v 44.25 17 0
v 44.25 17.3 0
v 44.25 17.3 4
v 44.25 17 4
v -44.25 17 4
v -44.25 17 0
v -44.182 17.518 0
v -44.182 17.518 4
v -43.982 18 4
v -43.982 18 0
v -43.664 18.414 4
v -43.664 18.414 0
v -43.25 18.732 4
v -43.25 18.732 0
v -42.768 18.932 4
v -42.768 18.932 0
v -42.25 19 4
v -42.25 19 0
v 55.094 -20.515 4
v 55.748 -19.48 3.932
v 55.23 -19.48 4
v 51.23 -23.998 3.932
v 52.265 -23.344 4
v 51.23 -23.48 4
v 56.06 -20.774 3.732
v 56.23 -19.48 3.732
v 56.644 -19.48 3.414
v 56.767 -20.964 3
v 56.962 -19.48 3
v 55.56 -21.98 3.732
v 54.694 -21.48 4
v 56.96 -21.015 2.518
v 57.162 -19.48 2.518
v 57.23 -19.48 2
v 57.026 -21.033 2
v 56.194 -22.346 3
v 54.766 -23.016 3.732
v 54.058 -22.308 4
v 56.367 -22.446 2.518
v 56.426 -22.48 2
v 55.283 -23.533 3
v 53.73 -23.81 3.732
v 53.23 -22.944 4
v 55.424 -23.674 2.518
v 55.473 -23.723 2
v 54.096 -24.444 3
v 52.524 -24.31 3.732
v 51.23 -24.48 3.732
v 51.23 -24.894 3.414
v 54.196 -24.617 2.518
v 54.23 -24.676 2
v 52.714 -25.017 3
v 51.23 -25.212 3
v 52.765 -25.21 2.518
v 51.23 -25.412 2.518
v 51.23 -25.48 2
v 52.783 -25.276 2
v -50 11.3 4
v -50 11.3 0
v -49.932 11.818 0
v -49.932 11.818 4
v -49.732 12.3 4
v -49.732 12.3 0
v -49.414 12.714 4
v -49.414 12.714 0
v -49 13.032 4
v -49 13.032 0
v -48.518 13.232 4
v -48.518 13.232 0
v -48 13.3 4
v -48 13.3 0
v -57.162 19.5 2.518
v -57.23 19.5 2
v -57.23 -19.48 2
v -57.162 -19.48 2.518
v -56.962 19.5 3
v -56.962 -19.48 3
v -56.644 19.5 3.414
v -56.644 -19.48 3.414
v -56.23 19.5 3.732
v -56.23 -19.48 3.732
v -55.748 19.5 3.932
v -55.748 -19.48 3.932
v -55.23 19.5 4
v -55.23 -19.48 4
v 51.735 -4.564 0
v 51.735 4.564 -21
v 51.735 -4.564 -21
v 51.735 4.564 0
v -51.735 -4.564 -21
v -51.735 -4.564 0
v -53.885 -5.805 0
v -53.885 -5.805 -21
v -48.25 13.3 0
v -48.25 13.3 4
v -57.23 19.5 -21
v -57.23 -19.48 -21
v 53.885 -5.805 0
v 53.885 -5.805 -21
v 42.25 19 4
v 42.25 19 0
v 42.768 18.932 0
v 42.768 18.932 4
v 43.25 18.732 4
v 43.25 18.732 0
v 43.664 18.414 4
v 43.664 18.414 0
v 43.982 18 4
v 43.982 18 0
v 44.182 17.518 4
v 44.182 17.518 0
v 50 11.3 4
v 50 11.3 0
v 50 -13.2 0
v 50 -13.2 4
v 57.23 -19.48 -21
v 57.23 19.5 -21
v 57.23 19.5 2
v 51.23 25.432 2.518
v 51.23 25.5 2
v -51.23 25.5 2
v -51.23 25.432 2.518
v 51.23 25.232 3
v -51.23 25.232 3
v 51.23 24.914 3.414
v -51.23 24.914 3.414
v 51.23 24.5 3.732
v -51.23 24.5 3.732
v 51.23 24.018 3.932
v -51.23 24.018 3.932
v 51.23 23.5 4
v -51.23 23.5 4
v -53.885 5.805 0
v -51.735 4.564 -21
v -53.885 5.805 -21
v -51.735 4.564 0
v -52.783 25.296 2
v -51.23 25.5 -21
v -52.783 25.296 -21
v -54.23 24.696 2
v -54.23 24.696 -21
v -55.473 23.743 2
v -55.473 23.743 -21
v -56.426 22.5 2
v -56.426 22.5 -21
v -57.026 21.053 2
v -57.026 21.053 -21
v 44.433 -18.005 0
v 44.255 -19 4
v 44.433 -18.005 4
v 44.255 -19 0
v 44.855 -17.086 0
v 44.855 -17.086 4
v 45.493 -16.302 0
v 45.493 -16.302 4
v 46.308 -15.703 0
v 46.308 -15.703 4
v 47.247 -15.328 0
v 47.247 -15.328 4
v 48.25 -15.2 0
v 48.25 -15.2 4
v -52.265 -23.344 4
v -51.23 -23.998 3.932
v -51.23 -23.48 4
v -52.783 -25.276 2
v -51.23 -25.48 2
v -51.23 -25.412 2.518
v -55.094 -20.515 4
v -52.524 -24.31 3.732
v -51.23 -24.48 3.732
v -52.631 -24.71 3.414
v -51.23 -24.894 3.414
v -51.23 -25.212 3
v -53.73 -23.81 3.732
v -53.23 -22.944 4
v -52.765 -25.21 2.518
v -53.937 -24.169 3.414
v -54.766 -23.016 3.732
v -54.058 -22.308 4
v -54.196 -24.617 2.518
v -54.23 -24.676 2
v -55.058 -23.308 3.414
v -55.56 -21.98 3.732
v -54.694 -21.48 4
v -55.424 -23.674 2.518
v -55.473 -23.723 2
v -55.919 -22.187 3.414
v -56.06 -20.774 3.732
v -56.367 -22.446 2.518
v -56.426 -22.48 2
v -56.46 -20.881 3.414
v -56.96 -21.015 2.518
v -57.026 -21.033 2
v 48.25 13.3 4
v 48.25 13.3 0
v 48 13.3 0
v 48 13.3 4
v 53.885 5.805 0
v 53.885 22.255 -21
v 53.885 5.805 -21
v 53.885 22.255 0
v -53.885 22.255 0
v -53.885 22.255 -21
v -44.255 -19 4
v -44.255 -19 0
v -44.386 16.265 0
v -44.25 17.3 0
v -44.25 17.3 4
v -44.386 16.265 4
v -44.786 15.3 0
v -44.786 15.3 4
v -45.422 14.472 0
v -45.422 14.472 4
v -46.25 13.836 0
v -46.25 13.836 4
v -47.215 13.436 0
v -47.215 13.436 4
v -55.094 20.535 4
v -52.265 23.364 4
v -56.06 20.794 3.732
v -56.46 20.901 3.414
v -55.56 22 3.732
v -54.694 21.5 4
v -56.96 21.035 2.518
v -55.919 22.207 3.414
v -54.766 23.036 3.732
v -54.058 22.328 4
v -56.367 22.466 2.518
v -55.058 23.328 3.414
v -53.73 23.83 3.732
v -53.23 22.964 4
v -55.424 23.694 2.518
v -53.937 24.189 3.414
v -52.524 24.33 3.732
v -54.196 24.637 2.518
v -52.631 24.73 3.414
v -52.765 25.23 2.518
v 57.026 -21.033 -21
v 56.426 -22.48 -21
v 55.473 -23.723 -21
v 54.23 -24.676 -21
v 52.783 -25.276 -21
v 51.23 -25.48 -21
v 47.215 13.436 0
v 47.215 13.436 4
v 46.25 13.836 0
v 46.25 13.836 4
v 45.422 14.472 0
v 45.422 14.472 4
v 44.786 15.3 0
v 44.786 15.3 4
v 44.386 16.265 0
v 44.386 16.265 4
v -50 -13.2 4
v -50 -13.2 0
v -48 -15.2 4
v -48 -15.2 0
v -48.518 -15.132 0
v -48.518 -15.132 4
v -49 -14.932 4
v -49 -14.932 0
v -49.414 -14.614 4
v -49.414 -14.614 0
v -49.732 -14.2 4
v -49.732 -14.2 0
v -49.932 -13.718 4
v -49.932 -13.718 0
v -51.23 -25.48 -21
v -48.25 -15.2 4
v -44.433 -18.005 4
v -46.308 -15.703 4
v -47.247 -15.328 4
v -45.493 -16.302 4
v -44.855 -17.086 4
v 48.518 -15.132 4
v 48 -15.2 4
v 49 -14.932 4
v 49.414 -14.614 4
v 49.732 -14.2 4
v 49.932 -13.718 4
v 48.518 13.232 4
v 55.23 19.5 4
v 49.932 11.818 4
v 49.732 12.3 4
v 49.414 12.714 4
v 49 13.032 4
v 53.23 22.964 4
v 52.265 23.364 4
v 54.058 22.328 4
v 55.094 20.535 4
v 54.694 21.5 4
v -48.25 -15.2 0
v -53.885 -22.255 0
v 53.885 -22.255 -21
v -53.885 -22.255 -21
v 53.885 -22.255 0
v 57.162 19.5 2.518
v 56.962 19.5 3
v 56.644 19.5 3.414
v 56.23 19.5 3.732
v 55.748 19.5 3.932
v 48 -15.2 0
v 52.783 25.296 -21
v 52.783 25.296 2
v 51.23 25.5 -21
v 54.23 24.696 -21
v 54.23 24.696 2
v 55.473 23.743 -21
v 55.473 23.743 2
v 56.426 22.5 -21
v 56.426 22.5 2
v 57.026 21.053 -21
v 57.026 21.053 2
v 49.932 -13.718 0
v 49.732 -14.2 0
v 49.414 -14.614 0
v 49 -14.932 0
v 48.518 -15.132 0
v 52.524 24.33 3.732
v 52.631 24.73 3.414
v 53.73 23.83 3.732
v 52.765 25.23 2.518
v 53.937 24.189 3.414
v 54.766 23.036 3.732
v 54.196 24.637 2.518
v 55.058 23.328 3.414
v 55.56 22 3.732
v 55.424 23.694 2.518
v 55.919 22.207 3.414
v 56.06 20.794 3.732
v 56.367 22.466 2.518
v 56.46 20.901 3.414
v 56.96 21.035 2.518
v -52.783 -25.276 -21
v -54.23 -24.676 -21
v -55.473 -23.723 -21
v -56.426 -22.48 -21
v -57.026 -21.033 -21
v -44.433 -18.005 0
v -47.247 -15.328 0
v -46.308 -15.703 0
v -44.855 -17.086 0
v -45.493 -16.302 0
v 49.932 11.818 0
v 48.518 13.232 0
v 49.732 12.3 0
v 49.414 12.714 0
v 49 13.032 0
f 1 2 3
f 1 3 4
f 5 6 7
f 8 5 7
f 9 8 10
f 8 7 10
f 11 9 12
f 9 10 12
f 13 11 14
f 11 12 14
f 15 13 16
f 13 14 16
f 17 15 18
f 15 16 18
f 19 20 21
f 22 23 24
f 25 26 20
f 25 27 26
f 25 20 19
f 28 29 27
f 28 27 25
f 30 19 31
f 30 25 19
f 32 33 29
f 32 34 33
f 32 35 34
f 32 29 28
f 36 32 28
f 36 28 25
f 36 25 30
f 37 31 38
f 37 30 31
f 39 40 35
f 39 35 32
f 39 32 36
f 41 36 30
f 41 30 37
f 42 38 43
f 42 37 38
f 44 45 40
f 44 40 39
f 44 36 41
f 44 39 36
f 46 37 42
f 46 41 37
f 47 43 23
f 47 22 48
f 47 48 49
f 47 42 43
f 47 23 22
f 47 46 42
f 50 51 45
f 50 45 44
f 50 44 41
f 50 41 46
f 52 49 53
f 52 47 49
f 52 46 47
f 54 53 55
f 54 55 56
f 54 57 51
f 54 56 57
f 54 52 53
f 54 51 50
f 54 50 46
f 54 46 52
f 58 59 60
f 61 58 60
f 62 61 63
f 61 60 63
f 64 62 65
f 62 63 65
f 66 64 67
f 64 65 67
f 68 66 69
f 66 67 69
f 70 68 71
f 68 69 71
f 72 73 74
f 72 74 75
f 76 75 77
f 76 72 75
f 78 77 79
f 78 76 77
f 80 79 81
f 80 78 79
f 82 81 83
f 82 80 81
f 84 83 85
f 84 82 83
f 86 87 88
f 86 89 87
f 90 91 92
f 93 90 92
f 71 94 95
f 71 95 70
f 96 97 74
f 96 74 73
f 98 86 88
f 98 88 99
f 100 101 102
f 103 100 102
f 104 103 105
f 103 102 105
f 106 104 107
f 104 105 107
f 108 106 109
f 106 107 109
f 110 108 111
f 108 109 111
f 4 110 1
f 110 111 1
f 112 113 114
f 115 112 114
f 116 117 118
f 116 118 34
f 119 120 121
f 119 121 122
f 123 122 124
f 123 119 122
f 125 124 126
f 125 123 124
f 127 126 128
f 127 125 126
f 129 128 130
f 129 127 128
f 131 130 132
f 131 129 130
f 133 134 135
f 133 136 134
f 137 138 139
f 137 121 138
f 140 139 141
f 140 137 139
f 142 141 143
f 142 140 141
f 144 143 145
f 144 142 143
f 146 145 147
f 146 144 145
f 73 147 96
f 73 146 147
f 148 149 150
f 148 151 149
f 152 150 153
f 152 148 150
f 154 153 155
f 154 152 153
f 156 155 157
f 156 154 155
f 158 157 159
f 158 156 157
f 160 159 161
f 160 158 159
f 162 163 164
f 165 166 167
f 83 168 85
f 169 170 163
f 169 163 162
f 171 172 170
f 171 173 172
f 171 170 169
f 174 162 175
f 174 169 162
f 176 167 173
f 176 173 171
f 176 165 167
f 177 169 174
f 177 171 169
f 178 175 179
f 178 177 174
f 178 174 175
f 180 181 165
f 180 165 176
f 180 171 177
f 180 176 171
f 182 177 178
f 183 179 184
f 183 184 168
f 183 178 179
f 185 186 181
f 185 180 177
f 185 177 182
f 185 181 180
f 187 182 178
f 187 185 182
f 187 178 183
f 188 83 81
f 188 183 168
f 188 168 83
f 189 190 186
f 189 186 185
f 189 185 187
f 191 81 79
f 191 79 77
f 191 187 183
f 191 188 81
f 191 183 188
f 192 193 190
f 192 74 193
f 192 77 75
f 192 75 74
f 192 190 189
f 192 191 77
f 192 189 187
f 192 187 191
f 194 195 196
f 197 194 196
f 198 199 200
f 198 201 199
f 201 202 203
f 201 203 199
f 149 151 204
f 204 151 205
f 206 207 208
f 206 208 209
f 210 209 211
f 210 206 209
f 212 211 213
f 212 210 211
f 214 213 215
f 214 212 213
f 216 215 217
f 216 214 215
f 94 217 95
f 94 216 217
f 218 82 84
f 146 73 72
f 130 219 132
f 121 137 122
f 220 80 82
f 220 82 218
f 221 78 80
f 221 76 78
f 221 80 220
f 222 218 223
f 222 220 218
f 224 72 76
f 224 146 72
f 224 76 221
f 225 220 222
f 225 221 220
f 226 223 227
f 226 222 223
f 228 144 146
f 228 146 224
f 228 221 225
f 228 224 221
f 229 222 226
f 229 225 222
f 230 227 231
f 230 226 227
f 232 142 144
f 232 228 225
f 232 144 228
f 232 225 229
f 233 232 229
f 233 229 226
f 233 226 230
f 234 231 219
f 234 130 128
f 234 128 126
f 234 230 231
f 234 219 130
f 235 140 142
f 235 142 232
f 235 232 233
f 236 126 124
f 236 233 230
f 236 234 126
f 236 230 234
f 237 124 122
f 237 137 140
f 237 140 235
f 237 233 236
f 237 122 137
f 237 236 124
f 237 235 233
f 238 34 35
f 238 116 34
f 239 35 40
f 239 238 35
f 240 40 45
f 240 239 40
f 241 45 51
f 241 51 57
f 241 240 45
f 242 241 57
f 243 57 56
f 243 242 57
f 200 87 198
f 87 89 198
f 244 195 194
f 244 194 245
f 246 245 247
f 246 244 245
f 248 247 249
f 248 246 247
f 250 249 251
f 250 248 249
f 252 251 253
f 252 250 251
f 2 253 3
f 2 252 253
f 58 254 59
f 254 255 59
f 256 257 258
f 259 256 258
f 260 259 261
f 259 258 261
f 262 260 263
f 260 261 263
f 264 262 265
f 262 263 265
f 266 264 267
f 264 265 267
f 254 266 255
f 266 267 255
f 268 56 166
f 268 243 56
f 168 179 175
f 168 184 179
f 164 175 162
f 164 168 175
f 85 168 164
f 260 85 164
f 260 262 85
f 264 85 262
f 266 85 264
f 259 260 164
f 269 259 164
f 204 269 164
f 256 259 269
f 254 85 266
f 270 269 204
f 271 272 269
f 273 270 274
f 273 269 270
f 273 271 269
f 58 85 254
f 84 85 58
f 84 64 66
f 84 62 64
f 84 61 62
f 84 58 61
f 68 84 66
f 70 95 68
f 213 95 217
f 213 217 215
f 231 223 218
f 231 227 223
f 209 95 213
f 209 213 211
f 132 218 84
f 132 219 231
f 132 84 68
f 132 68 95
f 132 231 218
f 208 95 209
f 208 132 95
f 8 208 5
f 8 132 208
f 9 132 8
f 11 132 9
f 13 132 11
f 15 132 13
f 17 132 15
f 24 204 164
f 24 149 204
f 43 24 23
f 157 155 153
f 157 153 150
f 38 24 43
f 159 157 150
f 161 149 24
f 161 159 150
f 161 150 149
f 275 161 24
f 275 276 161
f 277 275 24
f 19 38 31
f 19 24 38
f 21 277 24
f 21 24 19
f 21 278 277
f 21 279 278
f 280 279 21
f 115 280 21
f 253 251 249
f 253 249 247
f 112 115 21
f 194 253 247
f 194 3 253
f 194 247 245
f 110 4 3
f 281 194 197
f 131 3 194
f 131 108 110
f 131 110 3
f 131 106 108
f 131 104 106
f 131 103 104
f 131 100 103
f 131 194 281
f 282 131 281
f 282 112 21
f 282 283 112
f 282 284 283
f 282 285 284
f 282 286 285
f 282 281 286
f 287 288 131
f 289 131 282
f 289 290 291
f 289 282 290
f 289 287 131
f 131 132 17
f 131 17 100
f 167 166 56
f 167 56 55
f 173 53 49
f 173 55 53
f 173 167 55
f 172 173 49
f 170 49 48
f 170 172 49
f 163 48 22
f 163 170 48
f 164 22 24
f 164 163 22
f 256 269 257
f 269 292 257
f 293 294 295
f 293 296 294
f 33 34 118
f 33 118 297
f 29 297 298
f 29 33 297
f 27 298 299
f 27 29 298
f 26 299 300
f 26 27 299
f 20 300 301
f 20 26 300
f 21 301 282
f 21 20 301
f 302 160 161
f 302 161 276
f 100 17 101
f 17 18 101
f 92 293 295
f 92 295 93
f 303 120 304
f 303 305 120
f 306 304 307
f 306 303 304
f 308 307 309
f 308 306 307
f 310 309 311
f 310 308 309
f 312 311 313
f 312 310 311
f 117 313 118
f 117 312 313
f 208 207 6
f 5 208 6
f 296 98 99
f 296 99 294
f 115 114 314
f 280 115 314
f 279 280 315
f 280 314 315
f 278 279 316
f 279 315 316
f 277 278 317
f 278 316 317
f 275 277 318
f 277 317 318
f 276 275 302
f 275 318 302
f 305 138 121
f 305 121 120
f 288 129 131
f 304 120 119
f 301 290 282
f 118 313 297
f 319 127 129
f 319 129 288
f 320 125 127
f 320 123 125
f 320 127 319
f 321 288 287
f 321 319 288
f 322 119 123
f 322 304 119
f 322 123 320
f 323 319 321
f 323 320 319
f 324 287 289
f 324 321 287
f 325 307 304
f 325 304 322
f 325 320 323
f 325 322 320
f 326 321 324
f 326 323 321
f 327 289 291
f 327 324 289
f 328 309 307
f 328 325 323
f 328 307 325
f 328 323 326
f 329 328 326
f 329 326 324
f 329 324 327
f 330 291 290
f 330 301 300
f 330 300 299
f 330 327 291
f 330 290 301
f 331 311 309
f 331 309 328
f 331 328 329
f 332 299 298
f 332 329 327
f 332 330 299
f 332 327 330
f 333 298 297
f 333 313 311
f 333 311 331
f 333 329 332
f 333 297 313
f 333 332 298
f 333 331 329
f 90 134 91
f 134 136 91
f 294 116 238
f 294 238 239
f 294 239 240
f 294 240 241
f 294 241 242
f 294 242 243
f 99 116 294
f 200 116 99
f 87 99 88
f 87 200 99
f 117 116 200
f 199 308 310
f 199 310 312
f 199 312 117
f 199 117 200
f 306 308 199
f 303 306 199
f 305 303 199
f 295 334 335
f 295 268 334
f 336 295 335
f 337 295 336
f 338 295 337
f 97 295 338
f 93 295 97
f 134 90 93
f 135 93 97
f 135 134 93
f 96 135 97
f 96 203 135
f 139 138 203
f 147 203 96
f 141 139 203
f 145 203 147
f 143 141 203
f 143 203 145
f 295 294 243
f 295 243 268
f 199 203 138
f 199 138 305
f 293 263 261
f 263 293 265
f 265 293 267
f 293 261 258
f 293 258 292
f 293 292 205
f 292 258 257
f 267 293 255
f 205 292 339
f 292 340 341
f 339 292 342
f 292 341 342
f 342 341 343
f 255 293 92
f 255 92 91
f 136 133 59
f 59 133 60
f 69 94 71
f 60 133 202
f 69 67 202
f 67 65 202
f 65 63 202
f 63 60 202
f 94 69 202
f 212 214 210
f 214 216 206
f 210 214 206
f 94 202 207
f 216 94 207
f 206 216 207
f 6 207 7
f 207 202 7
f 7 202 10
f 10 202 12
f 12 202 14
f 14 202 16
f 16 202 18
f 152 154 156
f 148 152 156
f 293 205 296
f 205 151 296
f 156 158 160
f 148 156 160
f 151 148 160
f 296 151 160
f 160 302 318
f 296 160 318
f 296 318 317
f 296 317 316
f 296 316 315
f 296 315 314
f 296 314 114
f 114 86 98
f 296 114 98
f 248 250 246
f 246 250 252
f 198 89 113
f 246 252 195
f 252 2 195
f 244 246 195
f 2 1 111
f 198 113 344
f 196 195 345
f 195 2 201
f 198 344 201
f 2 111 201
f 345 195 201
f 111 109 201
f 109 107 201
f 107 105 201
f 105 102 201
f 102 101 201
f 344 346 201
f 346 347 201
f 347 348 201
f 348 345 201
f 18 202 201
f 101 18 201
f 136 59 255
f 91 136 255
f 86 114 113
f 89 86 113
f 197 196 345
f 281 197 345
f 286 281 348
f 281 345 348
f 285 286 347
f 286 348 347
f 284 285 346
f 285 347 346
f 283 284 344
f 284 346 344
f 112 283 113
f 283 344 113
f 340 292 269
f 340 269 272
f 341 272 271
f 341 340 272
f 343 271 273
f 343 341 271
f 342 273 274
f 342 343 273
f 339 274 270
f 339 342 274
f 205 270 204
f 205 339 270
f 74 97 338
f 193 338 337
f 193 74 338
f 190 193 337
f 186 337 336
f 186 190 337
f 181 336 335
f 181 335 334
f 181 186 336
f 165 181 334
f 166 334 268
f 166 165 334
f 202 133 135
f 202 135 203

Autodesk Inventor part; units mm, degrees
ref_plane "YZ Plane" through (0, 0, 0) normal (1, 0, 0) x (0, 1, 0)
ref_plane "XZ Plane" through (0, 0, 0) normal (0, 1, 0) x (-1, 0, 0)
ref_plane "XY Plane" through (0, 0, 0) normal (0, 0, 1) x (1, 0, 0)
sketch "Sketch1" plane through (0, 0, 0) normal (0, 0, 1) x (1, 0, 0)
  line L0 (-57.23, 25.5) -> (57.23, 25.5)
  line L1 (57.23, 25.5) -> (57.23, -25.48)
  line L2 (57.23, -25.48) -> (-57.23, -25.48)
  line L3 (-57.23, -25.48) -> (-57.23, 25.5)
  line L4 (-42.25, 19) -> (42.25, 19)
  line L5 (50, 11.3) -> (50, -13.2)
  line L6 (-50, -13.2) -> (-50, 11.3)
  line L7 (-53.6456, 17.3) -> (53.2492, 17.3) construction
  line L8 (-53.6456, -19.2) -> (53.2492, -19.2) construction
  line L9 (48.25, -31.9957) -> (48.25, 43.3545) construction
  line L10 (-48.25, 39.0692) -> (-48.25, -34.8525) construction
  line L11 (48.25, -15.2) -> (48, -15.2)
  line L12 (48.25, 13.3) -> (48, 13.3)
  line L13 (44.25, 17.3) -> (44.25, 17)
  line L14 (-48.25, 13.3) -> (-48, 13.3)
  line L15 (-44.25, 17.3) -> (-44.25, 17)
  line L16 (-48.25, -15.2) -> (-48, -15.2)
  arc A0 (-50, -13.2) -> (-48, -15.2) centre (-48, -13.2) ccw
  arc A1 (-48, 13.3) -> (-50, 11.3) centre (-48, 11.3) ccw
  arc A2 (-42.25, 19) -> (-44.25, 17) centre (-42.25, 17) ccw
  arc A3 (44.25, 17) -> (42.25, 19) centre (42.25, 17) ccw
  arc A4 (50, 11.3) -> (48, 13.3) centre (48, 11.3) ccw
  arc A5 (48, -15.2) -> (50, -13.2) centre (48, -13.2) ccw
  arc A6 (52.25, 17.3) -> (48.25, 21.3) centre (48.25, 17.3) ccw
  arc A7 (44.25, 17.3) -> (48.25, 13.3) centre (48.25, 17.3) ccw
  arc A8 (48.25, -15.2) -> (44.25, -19.2) centre (48.25, -19.2) ccw
  arc A9 (48.25, -23.2) -> (52.25, -19.2) centre (48.25, -19.2) ccw
  line L17 (50, -19) -> (48.25, -19)
  arc A10 (-48.25, 13.3) -> (-44.25, 17.3) centre (-48.25, 17.3) ccw
  arc A11 (-48.25, 21.3) -> (-52.25, 17.3) centre (-48.25, 17.3) ccw
  arc A12 (-44.25, -19.2) -> (-48.25, -15.2) centre (-48.25, -19.2) ccw
  arc A13 (-52.25, -19.2) -> (-48.25, -23.2) centre (-48.25, -19.2) ccw
  line L18 (44.255, -19) -> (-44.255, -19)
  line L19 (-48.25, -19) -> (-50, -19)
  point P0 (0, 0)
  point P1 (-50, 19)
  point P2 (50, 19)
  point P3 (-50, 13.3)
  point P4 (-50, -15.2)
  dimension "d0" = 114.46
  dimension "d1" = 57.23
  dimension "d2" = 25.5
  dimension "d3" = 25.48
  dimension "d4" = 100
  dimension "d10" = 50
  dimension "d11" = 17.3
  dimension "d12" = 19.2
  dimension "d13" = 96.5
  dimension "d14" = 48.25
  dimension "d19" = 2
  dimension "d20" = 2
extrude "Extrusion1" add sketch "Sketch1" along normal blind 4
sketch "Sketch2" plane through (0, 0, 0) normal (0, 0, -1) x (-1, 0, 0)
  line L0 (57.23, -25.48) -> (57.23, 25.5) projected
  line L1 (57.23, -25.48) -> (-57.23, -25.48) projected
  line L2 (57.23, 25.5) -> (-57.23, 25.5)
  line L3 (-57.23, 25.5) -> (-57.23, -25.48)
  line L4 (-57.23, -25.48) -> (57.23, -25.48)
  line L5 (57.23, -25.48) -> (57.23, 25.5)
  line L6 (53.885, 22.255) -> (-53.885, 22.255)
  line L7 (-53.885, 22.255) -> (-53.885, -22.255)
  line L8 (-53.885, -22.255) -> (53.885, -22.255)
  line L9 (53.885, -22.255) -> (53.885, 22.255)
  line L10 (-53.885, 5.805) -> (-51.735, 5.805)
  line L11 (-51.735, 5.805) -> (-51.735, -5.805)
  line L12 (-51.735, -5.805) -> (-53.885, -5.805)
  line L13 (-53.885, -5.805) -> (-53.885, 5.805)
  line L14 (53.885, 5.805) -> (51.735, 5.805)
  line L15 (51.735, 5.805) -> (51.735, -5.805)
  line L16 (51.735, -5.805) -> (53.885, -5.805)
  line L17 (53.885, -5.805) -> (53.885, 5.805)
  line L18 (-51.735, 4.5637) -> (-53.885, 5.805)
  line L19 (-51.735, -4.5637) -> (-53.885, -5.805)
  line L20 (51.735, 4.5637) -> (53.885, 5.805)
  line L21 (51.735, -4.5637) -> (53.885, -5.805)
  point P0 (0, 0)
  dimension "d23" = 44.51
  dimension "d24" = 22.255
  dimension "d25" = 107.77
  dimension "d26" = 53.885
  dimension "d28" = 103.47
  dimension "d30" = 51.735
  dimension "d31" = 11.61
  dimension "d32" = 5.805
  dimension "d33" = 11.61
  dimension "d34" = 5.805
  dimension "d35" = 30
  dimension "d36" = 30
  dimension "d37" = 30
  dimension "d38" = 30
extrude "Extrusion2" add sketch "Sketch2" along normal blind 21 contours L1 L3 L2 L0 | L9 L21 L15 L20 | L18 L11 L19 L7
fillet "Fillet1" radius 6 4 edges at (57.23, 25.5, -8.5) (-57.23, 25.5, -8.5) (57.23, -25.48, -8.5) (-57.23, -25.48, -8.5)
fillet "Fillet2" radius 2 8 edges at (0, -25.48, 4) (55.4726, -23.7226, 4) (57.23, 0.01, 4) (55.4726, 23.7426, 4) (0, 25.5, 4) (-55.4726, 23.7426, 4) (-57.23, 0.01, 4) (-55.4726, -23.7226, 4)
properties part number "EC3BK-40mm_Case_EndCap"
